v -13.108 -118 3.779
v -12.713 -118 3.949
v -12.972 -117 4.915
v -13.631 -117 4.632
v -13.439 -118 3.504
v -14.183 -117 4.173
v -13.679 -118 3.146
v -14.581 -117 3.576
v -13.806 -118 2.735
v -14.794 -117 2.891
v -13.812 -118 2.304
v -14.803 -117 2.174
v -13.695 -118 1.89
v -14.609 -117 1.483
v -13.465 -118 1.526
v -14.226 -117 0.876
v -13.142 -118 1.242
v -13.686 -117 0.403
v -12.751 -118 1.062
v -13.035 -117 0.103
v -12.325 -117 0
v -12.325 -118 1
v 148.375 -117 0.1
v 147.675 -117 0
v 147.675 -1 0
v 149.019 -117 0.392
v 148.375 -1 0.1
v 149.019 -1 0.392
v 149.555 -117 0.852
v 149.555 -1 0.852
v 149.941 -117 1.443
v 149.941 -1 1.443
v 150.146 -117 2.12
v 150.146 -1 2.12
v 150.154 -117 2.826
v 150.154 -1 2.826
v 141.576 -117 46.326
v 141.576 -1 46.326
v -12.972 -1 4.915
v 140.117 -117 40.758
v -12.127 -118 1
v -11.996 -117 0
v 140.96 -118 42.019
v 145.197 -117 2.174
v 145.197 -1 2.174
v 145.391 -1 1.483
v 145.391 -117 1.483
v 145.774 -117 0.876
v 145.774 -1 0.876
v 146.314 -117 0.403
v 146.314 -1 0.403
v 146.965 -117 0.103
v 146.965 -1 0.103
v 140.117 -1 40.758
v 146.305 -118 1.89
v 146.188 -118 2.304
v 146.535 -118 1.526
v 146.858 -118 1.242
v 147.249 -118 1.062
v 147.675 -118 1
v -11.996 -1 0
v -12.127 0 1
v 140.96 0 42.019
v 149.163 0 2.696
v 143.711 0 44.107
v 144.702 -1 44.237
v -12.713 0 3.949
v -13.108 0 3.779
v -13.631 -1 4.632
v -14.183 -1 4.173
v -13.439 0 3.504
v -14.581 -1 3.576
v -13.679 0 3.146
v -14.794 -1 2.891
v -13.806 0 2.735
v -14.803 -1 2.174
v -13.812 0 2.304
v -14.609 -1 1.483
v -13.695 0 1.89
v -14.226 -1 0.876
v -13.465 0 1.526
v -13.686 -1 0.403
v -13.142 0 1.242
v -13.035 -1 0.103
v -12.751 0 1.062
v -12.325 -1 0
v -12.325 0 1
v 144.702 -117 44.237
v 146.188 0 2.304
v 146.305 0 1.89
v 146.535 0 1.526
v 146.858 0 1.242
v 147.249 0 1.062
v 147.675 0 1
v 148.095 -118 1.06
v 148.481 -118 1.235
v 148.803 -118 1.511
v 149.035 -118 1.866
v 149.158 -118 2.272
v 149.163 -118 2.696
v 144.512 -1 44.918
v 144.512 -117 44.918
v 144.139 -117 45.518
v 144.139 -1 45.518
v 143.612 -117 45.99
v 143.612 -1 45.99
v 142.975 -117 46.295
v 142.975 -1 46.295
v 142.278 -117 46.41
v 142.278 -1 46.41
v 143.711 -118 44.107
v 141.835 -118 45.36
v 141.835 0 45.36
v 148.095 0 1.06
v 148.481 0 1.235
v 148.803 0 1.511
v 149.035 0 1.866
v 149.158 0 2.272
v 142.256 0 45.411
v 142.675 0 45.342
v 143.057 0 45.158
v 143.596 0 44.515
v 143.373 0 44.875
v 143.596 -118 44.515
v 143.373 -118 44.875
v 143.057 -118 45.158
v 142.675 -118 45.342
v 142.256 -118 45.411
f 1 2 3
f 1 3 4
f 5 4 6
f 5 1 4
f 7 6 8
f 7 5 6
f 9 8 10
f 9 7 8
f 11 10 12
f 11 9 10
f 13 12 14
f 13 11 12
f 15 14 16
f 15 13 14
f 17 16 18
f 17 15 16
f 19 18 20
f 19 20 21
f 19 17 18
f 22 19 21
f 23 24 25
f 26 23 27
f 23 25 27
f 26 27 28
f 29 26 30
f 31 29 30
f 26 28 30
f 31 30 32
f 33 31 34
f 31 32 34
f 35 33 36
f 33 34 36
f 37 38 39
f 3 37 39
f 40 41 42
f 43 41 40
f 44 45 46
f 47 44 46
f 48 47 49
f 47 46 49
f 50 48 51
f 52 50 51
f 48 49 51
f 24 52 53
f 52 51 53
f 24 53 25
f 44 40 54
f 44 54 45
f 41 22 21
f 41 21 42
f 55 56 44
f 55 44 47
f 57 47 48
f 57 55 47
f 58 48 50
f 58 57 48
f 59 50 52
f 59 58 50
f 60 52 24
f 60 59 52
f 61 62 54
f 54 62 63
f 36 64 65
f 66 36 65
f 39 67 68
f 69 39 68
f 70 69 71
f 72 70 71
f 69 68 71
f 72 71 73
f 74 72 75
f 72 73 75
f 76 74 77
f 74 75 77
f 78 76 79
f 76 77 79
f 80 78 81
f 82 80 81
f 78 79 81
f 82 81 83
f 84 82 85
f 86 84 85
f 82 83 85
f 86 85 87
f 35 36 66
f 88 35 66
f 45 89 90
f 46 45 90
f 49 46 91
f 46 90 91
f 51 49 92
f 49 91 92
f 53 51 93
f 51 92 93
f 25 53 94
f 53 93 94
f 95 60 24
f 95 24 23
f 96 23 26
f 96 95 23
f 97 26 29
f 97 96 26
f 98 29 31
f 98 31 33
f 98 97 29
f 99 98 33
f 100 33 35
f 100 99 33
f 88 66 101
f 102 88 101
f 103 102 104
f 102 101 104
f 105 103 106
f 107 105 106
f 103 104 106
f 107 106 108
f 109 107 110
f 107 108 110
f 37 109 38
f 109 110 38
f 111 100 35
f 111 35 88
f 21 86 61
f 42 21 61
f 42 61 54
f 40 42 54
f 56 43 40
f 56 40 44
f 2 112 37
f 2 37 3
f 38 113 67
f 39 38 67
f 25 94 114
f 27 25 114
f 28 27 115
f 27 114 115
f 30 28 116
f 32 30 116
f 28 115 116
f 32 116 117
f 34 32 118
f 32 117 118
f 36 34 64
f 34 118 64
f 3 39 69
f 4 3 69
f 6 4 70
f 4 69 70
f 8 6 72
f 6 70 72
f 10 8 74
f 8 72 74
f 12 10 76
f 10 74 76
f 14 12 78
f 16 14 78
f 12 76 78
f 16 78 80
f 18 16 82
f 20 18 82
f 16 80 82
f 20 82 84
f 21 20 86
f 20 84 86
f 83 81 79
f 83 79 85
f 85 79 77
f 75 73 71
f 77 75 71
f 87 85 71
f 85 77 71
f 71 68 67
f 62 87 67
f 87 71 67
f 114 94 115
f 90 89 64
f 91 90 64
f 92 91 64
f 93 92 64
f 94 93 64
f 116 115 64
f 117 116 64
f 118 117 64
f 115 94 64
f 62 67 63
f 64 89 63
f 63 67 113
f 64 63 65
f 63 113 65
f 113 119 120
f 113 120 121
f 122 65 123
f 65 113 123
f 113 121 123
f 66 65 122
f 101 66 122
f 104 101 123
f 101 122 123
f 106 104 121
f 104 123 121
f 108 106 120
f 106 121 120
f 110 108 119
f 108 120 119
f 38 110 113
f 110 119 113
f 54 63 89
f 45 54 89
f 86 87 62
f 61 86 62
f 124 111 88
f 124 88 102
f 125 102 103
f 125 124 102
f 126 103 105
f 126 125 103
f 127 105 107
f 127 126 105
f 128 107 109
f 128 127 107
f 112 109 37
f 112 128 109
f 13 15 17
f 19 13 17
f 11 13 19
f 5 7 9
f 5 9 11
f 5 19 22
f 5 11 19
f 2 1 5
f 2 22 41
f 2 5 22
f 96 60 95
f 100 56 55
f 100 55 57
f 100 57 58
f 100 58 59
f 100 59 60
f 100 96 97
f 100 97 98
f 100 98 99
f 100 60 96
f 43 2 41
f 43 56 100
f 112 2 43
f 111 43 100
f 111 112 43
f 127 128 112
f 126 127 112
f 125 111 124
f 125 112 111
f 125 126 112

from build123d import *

# Parameters (mm, degrees)
F1_DEPTH = 118
F2_SIZE  = 1


with BuildPart() as f1:
    # F0 (on Front) → F1 (new body)
    with BuildSketch(Plane.XZ):
        with BuildLine():
            ThreePointArc((-12.9717128781, 4.9148145657), (-14.8032774188, 2.1736845194), (-12.3246652653, 0))
            Line((-12.3246652653, 0), (-11.9955340214, 0))
            Line((-11.9955340214, 0), (140.1169462795, 40.7584162553))
            Line((140.1169462795, 40.7584162553), (145.1967225812, 2.1736845194))
            ThreePointArc((145.1967225812, 2.1736845194), (146.0269701969, 0.6204004813), (147.6753347347, 0))
            ThreePointArc((147.6753347347, 0), (149.5549342534, 0.8516354622), (150.1539468881, 2.8263154806))
            Line((150.1539468881, 2.8263154805), (144.7020790944, 44.237362697))
            ThreePointArc((144.7020790944, 44.237362697), (143.6123925235, 45.9897212472), (141.5764193282, 46.3258617821))
            Line((141.5764193282, 46.3258617821), (-12.9717128781, 4.9148145657))
        make_face()
    extrude(amount=F1_DEPTH)

    # F2
    f2_edges = [f1.edges().sort_by_distance(p)[0] for p in [
        (64.302353, -118, 25.620338),
        (-14.803277, -118, 2.173685),
        (-12.1601, -118, 0),
        (64.060706, -118, 20.379208),
        (142.656834, -118, 21.46605),
        (148.00165, -118, 0.021388),
        (147.428013, -118, 23.531839),
        (143.612393, -118, 45.989721),
        (64.302353, 0, 25.620338),
        (-14.803277, 0, 2.173685),
        (-12.1601, 0, 0),
        (64.060706, 0, 20.379208),
        (142.656834, 0, 21.46605),
        (148.00165, 0, 0.021388),
        (147.428013, 0, 23.531839),
        (143.612393, 0, 45.989721),
    ]]
    chamfer(f2_edges, length=F2_SIZE)


solid = f1.part
